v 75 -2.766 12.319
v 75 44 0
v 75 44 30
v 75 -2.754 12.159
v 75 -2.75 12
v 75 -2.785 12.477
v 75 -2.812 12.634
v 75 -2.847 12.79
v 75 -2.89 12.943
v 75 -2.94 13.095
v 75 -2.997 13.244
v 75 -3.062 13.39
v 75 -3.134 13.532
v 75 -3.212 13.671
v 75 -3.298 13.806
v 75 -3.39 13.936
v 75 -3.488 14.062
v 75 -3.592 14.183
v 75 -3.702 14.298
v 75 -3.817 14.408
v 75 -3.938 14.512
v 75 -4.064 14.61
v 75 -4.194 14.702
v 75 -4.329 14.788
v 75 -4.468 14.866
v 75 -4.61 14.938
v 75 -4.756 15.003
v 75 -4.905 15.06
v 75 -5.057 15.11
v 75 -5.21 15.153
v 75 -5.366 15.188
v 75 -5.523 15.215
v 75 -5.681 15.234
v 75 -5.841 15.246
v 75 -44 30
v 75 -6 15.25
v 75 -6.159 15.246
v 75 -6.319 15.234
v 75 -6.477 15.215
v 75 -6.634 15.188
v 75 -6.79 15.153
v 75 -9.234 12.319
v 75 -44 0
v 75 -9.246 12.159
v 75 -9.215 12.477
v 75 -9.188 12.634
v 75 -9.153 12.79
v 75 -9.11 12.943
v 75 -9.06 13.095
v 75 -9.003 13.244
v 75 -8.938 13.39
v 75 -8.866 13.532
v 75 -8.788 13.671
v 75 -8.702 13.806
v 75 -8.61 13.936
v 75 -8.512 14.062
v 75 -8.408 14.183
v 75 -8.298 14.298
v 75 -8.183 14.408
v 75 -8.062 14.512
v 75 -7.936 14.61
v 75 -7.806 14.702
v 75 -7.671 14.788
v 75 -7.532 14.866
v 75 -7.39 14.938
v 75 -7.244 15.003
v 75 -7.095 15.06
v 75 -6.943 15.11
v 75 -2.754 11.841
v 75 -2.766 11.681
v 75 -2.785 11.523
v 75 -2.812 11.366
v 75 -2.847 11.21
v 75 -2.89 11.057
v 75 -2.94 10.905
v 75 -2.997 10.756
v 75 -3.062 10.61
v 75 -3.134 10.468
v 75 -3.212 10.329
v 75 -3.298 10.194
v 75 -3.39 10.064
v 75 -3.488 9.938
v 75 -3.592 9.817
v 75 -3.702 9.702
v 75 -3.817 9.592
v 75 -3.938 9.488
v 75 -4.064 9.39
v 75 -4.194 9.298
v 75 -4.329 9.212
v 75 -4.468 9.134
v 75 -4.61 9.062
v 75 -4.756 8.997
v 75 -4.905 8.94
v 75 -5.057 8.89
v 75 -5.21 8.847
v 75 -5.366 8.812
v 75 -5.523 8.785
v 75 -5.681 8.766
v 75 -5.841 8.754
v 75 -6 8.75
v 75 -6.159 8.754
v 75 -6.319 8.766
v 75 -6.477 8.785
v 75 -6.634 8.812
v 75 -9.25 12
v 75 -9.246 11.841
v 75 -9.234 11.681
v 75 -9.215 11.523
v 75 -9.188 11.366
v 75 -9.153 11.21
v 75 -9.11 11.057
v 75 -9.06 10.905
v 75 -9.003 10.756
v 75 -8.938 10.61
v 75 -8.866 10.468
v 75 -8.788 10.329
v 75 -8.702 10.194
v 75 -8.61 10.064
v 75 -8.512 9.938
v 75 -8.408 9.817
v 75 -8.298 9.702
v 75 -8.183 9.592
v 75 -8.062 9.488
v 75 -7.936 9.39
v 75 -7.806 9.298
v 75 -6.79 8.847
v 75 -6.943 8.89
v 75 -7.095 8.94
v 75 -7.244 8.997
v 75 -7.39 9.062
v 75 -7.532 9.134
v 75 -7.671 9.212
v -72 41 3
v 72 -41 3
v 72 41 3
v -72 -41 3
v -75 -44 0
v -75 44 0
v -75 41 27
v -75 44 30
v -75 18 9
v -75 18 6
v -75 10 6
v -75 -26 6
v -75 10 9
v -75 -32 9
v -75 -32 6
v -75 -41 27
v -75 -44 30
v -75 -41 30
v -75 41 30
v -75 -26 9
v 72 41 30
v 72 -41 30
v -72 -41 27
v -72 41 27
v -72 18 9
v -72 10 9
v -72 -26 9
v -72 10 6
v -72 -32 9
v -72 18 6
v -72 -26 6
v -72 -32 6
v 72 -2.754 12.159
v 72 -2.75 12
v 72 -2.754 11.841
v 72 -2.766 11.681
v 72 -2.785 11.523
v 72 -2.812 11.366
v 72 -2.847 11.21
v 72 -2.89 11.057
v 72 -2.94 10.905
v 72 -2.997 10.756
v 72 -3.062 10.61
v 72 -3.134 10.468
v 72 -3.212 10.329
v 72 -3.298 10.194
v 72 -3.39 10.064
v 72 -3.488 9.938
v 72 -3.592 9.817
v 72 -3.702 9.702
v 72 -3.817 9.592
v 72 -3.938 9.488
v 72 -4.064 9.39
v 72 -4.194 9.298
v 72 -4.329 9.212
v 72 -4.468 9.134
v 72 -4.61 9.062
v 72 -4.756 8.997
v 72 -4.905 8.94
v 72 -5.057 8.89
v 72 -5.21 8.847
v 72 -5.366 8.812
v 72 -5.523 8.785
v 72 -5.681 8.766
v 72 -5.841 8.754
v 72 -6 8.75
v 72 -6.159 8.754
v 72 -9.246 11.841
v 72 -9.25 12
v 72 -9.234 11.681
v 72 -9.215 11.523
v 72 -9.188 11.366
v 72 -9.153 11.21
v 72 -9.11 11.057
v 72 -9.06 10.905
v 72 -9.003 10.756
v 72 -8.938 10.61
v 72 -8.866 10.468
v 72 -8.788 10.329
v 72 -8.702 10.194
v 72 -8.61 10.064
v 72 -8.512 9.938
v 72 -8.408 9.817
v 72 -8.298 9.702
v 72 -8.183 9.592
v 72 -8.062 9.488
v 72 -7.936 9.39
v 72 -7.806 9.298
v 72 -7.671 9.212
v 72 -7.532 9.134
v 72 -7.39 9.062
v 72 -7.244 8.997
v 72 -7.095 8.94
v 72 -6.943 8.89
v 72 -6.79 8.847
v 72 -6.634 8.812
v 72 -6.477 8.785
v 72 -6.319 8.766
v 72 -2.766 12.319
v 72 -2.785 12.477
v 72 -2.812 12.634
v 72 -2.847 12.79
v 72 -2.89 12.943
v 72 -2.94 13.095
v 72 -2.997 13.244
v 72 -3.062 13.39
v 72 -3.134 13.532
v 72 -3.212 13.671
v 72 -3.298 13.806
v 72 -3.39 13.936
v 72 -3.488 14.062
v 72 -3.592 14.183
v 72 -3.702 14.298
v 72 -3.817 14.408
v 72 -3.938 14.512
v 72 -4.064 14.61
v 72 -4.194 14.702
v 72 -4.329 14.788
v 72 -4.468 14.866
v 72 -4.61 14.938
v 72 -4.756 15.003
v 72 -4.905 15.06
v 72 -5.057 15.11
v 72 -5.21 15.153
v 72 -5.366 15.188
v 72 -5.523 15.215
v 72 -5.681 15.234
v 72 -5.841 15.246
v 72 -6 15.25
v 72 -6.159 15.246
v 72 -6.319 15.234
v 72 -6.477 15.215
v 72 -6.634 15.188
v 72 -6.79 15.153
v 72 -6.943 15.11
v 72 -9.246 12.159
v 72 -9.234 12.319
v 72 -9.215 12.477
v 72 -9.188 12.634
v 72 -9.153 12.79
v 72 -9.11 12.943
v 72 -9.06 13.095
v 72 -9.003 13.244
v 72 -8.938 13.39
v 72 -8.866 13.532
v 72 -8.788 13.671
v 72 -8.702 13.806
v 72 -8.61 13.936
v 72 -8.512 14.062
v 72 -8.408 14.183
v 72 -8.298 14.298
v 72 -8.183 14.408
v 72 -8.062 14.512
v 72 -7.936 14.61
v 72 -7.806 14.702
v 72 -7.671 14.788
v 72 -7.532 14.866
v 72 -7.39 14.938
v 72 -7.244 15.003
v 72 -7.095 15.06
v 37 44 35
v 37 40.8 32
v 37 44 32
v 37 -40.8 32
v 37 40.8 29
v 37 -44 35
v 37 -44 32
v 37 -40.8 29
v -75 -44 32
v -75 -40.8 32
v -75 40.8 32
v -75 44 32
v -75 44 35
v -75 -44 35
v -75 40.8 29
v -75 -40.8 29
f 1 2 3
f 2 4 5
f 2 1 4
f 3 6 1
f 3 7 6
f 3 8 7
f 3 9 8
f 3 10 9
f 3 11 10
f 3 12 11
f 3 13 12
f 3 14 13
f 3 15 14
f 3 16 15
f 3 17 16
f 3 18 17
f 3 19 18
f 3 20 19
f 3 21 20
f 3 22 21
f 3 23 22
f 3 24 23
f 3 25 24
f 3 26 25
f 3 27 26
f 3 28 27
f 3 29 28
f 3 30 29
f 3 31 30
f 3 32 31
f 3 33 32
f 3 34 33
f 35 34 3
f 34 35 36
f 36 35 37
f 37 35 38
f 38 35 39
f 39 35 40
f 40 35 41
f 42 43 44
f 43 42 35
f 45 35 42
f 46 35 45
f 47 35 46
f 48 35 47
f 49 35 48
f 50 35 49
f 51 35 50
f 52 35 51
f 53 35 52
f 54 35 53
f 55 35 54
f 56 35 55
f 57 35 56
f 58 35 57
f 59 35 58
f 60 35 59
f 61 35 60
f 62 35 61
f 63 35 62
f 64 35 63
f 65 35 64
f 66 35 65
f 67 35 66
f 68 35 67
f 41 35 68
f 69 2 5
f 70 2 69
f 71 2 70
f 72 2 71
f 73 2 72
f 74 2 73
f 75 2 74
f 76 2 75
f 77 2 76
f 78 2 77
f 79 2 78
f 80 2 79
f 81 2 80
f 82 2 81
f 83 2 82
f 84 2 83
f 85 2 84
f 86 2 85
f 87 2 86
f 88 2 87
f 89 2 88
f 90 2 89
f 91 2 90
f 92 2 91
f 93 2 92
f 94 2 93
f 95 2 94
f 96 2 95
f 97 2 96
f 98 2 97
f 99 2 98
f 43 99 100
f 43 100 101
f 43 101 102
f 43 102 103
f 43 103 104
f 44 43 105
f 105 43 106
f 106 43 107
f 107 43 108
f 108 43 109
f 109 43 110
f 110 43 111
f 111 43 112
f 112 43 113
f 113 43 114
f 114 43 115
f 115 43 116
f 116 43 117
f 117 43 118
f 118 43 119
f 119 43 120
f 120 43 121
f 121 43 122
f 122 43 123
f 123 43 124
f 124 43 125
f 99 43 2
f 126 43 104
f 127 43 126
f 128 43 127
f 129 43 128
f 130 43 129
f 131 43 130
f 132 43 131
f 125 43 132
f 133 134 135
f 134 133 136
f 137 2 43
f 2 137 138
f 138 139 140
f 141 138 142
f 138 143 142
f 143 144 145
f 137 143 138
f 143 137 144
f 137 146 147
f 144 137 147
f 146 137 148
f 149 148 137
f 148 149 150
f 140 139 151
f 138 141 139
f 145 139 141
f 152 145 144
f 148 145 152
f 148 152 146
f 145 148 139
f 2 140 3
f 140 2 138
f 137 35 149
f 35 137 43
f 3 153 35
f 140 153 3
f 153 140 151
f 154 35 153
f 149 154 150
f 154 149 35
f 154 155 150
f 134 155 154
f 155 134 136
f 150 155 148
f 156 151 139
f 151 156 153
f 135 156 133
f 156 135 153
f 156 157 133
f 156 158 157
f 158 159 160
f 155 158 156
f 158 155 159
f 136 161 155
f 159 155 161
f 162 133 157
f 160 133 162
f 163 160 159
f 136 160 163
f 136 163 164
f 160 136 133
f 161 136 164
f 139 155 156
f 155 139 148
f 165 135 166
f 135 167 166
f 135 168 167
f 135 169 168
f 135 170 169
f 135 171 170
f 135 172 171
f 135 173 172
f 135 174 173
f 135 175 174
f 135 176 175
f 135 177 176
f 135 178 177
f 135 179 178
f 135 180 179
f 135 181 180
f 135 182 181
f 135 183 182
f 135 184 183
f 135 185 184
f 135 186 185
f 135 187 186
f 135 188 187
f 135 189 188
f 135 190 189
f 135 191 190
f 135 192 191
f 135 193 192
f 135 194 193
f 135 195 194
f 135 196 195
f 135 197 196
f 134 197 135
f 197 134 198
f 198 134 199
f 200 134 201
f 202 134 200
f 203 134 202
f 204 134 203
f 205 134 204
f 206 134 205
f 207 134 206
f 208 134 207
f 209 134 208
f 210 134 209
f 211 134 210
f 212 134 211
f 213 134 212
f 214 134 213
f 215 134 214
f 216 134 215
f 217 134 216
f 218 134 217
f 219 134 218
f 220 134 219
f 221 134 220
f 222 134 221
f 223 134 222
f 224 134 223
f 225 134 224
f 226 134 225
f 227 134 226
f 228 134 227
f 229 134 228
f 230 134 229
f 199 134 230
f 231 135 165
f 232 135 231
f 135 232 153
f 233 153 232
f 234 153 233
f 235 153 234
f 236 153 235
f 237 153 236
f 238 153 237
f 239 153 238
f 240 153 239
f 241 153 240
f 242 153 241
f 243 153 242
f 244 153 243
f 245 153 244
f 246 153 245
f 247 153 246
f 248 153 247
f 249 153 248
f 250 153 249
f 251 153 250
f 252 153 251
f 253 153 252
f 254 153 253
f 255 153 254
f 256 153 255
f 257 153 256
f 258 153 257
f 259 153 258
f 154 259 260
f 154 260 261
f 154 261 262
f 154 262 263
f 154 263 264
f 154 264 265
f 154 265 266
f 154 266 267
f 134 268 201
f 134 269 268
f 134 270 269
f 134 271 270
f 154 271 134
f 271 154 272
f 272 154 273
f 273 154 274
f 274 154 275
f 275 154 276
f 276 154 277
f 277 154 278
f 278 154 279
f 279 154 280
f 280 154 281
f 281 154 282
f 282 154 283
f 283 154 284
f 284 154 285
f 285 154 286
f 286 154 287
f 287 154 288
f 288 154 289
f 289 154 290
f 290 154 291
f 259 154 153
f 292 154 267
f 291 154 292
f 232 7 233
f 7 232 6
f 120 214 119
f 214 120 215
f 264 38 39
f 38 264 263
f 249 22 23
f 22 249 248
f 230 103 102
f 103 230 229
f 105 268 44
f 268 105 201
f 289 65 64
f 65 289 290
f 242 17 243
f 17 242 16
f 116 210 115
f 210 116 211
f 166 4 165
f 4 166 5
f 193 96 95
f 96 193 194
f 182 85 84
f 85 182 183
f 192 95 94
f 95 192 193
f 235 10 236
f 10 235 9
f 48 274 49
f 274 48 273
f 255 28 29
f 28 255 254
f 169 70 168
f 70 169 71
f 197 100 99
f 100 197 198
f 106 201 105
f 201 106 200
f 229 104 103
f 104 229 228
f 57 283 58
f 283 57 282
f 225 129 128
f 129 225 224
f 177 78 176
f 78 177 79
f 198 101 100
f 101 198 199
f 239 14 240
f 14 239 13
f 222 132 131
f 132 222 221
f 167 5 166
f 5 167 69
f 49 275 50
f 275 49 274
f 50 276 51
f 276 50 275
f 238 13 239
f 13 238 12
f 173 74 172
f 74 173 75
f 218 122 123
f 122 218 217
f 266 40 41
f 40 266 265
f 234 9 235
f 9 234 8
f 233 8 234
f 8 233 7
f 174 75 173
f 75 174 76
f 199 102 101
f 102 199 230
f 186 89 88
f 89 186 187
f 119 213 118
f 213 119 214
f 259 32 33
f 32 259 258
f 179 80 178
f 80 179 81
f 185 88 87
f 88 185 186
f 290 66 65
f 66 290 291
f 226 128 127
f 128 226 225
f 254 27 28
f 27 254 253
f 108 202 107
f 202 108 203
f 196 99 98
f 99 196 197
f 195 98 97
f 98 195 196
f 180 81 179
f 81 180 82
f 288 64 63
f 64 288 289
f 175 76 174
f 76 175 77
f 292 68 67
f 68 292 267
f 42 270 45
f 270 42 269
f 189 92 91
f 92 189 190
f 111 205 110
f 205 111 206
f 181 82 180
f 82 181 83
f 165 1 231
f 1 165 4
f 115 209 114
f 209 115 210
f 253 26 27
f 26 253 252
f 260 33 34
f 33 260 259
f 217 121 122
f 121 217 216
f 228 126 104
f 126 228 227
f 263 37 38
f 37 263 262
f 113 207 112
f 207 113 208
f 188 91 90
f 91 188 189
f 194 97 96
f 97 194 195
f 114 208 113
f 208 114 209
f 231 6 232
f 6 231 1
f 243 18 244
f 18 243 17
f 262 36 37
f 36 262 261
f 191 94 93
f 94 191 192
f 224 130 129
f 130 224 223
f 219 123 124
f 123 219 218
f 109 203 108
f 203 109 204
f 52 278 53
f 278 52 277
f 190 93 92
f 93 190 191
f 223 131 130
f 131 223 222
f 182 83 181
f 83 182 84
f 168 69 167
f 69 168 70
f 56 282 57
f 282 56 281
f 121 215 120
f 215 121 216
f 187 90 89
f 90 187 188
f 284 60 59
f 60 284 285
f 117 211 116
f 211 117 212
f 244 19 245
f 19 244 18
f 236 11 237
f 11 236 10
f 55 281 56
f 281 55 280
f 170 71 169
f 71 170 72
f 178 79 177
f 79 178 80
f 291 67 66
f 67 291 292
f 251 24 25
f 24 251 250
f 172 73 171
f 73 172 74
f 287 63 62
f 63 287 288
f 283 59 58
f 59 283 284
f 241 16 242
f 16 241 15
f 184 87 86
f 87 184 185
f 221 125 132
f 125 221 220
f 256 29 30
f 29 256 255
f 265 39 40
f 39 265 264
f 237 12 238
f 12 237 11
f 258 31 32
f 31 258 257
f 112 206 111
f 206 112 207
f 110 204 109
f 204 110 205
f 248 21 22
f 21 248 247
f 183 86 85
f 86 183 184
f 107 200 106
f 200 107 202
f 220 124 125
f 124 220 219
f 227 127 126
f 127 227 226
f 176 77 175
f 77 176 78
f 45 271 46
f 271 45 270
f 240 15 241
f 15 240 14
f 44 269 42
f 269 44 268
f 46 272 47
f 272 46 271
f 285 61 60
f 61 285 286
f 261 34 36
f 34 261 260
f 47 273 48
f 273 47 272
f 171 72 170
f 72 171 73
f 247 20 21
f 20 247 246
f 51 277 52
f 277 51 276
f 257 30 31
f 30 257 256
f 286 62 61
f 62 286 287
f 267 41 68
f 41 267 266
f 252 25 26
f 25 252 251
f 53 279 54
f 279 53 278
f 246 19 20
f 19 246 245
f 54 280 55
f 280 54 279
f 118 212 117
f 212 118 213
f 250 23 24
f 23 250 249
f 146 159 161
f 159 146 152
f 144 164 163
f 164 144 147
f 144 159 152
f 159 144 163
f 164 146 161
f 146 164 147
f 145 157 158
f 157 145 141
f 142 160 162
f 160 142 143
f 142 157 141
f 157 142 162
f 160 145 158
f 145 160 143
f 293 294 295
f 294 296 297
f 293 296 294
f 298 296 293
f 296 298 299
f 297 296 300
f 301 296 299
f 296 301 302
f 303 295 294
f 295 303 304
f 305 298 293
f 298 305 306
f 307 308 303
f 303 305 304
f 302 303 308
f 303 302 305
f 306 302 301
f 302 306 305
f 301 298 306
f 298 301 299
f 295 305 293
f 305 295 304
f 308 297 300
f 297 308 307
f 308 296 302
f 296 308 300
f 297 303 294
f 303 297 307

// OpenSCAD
// 3d printable box with lid with holes for buttons
// units all in mm

// base
length = 150;
width = 88;
height = 30;
wall = 3;

// led_hole
led_hole_radius = 3.25;
led_hole_delta_x = 6;
led_hole_delta_z = 12;

// relay hole
relay_hole_width = 6;
relay_hole_height = 3;
relay_hole_delta_x = 32;
relay_hole_delta_z = 6;

// charger hole
charger_hole_width = 8;
charger_hole_height = 3;
charger_hole_delta_x = -10;
charger_hole_delta_z = 6;

// lid
lid_channel_padding = 0.2;
lid_length = 112;

dx = 0.01;
$fn = 128;

module base(length, width, height, wall) {
    union() {
        translate([-length/2,-width/2,0])
            cube([length, width, wall]);
        translate([-length/2,-width/2,wall-dx])
            cube([length, wall, height-wall+dx]);
        translate([-length/2,width/2-wall,wall-dx])
            cube([length, wall, height-wall+dx]);
        translate([-length/2,-width/2+wall-dx,wall-dx])
            cube([wall, width-2*wall+2*dx, height-2*wall+dx]);
        translate([length/2-wall,-width/2+wall-dx,wall-dx])
            cube([wall, width-2*wall+2*dx, height-wall+dx]);
    }
}

module led_hole(box_length, box_wall, hole_radius, delta_x, delta_z) {
    translate([box_length/2-box_wall-dx, -delta_x, delta_z])
        rotate([0, 90, 0])
            cylinder(box_wall+2*dx, hole_radius, hole_radius);
}
module relay_hole(box_length, box_wall, hole_width, hole_height, delta_x, delta_z) {
    translate([-box_length/2-dx, -delta_x, delta_z])
        cube([box_wall+2*dx, hole_width, hole_height]);
}
module charger_hole(box_length, box_wall, hole_width, hole_height, delta_x, delta_z) {
    translate([-box_length/2-dx, -delta_x, delta_z])
        cube([box_wall+2*dx, hole_width, hole_height]);
}

module lid(box_length, box_width, wall, lid_length, lid_padding) {
    union() {
        translate([-box_length/2, -box_width/2, 0])
            cube([lid_length, box_width, wall]);
        translate([-box_length/2, -box_width/2+wall+lid_padding, wall-dx])
            cube([lid_length, box_width-2*wall-2*lid_padding, wall+dx]);
    }
}

difference() {
    base(length, width, height, wall);
    led_hole(length, wall, led_hole_radius, led_hole_delta_x, led_hole_delta_z);
    relay_hole(length, wall, relay_hole_width, relay_hole_height, relay_hole_delta_x, relay_hole_delta_z);
    charger_hole(length, wall, charger_hole_width, charger_hole_height, charger_hole_delta_x, charger_hole_delta_z);
}

//!lid(length, width, wall, lid_length, lid_channel_padding);

translate([0,0,height+wall+2])
    rotate([180,0,0])
        lid(length, width, wall, lid_length, lid_channel_padding);
